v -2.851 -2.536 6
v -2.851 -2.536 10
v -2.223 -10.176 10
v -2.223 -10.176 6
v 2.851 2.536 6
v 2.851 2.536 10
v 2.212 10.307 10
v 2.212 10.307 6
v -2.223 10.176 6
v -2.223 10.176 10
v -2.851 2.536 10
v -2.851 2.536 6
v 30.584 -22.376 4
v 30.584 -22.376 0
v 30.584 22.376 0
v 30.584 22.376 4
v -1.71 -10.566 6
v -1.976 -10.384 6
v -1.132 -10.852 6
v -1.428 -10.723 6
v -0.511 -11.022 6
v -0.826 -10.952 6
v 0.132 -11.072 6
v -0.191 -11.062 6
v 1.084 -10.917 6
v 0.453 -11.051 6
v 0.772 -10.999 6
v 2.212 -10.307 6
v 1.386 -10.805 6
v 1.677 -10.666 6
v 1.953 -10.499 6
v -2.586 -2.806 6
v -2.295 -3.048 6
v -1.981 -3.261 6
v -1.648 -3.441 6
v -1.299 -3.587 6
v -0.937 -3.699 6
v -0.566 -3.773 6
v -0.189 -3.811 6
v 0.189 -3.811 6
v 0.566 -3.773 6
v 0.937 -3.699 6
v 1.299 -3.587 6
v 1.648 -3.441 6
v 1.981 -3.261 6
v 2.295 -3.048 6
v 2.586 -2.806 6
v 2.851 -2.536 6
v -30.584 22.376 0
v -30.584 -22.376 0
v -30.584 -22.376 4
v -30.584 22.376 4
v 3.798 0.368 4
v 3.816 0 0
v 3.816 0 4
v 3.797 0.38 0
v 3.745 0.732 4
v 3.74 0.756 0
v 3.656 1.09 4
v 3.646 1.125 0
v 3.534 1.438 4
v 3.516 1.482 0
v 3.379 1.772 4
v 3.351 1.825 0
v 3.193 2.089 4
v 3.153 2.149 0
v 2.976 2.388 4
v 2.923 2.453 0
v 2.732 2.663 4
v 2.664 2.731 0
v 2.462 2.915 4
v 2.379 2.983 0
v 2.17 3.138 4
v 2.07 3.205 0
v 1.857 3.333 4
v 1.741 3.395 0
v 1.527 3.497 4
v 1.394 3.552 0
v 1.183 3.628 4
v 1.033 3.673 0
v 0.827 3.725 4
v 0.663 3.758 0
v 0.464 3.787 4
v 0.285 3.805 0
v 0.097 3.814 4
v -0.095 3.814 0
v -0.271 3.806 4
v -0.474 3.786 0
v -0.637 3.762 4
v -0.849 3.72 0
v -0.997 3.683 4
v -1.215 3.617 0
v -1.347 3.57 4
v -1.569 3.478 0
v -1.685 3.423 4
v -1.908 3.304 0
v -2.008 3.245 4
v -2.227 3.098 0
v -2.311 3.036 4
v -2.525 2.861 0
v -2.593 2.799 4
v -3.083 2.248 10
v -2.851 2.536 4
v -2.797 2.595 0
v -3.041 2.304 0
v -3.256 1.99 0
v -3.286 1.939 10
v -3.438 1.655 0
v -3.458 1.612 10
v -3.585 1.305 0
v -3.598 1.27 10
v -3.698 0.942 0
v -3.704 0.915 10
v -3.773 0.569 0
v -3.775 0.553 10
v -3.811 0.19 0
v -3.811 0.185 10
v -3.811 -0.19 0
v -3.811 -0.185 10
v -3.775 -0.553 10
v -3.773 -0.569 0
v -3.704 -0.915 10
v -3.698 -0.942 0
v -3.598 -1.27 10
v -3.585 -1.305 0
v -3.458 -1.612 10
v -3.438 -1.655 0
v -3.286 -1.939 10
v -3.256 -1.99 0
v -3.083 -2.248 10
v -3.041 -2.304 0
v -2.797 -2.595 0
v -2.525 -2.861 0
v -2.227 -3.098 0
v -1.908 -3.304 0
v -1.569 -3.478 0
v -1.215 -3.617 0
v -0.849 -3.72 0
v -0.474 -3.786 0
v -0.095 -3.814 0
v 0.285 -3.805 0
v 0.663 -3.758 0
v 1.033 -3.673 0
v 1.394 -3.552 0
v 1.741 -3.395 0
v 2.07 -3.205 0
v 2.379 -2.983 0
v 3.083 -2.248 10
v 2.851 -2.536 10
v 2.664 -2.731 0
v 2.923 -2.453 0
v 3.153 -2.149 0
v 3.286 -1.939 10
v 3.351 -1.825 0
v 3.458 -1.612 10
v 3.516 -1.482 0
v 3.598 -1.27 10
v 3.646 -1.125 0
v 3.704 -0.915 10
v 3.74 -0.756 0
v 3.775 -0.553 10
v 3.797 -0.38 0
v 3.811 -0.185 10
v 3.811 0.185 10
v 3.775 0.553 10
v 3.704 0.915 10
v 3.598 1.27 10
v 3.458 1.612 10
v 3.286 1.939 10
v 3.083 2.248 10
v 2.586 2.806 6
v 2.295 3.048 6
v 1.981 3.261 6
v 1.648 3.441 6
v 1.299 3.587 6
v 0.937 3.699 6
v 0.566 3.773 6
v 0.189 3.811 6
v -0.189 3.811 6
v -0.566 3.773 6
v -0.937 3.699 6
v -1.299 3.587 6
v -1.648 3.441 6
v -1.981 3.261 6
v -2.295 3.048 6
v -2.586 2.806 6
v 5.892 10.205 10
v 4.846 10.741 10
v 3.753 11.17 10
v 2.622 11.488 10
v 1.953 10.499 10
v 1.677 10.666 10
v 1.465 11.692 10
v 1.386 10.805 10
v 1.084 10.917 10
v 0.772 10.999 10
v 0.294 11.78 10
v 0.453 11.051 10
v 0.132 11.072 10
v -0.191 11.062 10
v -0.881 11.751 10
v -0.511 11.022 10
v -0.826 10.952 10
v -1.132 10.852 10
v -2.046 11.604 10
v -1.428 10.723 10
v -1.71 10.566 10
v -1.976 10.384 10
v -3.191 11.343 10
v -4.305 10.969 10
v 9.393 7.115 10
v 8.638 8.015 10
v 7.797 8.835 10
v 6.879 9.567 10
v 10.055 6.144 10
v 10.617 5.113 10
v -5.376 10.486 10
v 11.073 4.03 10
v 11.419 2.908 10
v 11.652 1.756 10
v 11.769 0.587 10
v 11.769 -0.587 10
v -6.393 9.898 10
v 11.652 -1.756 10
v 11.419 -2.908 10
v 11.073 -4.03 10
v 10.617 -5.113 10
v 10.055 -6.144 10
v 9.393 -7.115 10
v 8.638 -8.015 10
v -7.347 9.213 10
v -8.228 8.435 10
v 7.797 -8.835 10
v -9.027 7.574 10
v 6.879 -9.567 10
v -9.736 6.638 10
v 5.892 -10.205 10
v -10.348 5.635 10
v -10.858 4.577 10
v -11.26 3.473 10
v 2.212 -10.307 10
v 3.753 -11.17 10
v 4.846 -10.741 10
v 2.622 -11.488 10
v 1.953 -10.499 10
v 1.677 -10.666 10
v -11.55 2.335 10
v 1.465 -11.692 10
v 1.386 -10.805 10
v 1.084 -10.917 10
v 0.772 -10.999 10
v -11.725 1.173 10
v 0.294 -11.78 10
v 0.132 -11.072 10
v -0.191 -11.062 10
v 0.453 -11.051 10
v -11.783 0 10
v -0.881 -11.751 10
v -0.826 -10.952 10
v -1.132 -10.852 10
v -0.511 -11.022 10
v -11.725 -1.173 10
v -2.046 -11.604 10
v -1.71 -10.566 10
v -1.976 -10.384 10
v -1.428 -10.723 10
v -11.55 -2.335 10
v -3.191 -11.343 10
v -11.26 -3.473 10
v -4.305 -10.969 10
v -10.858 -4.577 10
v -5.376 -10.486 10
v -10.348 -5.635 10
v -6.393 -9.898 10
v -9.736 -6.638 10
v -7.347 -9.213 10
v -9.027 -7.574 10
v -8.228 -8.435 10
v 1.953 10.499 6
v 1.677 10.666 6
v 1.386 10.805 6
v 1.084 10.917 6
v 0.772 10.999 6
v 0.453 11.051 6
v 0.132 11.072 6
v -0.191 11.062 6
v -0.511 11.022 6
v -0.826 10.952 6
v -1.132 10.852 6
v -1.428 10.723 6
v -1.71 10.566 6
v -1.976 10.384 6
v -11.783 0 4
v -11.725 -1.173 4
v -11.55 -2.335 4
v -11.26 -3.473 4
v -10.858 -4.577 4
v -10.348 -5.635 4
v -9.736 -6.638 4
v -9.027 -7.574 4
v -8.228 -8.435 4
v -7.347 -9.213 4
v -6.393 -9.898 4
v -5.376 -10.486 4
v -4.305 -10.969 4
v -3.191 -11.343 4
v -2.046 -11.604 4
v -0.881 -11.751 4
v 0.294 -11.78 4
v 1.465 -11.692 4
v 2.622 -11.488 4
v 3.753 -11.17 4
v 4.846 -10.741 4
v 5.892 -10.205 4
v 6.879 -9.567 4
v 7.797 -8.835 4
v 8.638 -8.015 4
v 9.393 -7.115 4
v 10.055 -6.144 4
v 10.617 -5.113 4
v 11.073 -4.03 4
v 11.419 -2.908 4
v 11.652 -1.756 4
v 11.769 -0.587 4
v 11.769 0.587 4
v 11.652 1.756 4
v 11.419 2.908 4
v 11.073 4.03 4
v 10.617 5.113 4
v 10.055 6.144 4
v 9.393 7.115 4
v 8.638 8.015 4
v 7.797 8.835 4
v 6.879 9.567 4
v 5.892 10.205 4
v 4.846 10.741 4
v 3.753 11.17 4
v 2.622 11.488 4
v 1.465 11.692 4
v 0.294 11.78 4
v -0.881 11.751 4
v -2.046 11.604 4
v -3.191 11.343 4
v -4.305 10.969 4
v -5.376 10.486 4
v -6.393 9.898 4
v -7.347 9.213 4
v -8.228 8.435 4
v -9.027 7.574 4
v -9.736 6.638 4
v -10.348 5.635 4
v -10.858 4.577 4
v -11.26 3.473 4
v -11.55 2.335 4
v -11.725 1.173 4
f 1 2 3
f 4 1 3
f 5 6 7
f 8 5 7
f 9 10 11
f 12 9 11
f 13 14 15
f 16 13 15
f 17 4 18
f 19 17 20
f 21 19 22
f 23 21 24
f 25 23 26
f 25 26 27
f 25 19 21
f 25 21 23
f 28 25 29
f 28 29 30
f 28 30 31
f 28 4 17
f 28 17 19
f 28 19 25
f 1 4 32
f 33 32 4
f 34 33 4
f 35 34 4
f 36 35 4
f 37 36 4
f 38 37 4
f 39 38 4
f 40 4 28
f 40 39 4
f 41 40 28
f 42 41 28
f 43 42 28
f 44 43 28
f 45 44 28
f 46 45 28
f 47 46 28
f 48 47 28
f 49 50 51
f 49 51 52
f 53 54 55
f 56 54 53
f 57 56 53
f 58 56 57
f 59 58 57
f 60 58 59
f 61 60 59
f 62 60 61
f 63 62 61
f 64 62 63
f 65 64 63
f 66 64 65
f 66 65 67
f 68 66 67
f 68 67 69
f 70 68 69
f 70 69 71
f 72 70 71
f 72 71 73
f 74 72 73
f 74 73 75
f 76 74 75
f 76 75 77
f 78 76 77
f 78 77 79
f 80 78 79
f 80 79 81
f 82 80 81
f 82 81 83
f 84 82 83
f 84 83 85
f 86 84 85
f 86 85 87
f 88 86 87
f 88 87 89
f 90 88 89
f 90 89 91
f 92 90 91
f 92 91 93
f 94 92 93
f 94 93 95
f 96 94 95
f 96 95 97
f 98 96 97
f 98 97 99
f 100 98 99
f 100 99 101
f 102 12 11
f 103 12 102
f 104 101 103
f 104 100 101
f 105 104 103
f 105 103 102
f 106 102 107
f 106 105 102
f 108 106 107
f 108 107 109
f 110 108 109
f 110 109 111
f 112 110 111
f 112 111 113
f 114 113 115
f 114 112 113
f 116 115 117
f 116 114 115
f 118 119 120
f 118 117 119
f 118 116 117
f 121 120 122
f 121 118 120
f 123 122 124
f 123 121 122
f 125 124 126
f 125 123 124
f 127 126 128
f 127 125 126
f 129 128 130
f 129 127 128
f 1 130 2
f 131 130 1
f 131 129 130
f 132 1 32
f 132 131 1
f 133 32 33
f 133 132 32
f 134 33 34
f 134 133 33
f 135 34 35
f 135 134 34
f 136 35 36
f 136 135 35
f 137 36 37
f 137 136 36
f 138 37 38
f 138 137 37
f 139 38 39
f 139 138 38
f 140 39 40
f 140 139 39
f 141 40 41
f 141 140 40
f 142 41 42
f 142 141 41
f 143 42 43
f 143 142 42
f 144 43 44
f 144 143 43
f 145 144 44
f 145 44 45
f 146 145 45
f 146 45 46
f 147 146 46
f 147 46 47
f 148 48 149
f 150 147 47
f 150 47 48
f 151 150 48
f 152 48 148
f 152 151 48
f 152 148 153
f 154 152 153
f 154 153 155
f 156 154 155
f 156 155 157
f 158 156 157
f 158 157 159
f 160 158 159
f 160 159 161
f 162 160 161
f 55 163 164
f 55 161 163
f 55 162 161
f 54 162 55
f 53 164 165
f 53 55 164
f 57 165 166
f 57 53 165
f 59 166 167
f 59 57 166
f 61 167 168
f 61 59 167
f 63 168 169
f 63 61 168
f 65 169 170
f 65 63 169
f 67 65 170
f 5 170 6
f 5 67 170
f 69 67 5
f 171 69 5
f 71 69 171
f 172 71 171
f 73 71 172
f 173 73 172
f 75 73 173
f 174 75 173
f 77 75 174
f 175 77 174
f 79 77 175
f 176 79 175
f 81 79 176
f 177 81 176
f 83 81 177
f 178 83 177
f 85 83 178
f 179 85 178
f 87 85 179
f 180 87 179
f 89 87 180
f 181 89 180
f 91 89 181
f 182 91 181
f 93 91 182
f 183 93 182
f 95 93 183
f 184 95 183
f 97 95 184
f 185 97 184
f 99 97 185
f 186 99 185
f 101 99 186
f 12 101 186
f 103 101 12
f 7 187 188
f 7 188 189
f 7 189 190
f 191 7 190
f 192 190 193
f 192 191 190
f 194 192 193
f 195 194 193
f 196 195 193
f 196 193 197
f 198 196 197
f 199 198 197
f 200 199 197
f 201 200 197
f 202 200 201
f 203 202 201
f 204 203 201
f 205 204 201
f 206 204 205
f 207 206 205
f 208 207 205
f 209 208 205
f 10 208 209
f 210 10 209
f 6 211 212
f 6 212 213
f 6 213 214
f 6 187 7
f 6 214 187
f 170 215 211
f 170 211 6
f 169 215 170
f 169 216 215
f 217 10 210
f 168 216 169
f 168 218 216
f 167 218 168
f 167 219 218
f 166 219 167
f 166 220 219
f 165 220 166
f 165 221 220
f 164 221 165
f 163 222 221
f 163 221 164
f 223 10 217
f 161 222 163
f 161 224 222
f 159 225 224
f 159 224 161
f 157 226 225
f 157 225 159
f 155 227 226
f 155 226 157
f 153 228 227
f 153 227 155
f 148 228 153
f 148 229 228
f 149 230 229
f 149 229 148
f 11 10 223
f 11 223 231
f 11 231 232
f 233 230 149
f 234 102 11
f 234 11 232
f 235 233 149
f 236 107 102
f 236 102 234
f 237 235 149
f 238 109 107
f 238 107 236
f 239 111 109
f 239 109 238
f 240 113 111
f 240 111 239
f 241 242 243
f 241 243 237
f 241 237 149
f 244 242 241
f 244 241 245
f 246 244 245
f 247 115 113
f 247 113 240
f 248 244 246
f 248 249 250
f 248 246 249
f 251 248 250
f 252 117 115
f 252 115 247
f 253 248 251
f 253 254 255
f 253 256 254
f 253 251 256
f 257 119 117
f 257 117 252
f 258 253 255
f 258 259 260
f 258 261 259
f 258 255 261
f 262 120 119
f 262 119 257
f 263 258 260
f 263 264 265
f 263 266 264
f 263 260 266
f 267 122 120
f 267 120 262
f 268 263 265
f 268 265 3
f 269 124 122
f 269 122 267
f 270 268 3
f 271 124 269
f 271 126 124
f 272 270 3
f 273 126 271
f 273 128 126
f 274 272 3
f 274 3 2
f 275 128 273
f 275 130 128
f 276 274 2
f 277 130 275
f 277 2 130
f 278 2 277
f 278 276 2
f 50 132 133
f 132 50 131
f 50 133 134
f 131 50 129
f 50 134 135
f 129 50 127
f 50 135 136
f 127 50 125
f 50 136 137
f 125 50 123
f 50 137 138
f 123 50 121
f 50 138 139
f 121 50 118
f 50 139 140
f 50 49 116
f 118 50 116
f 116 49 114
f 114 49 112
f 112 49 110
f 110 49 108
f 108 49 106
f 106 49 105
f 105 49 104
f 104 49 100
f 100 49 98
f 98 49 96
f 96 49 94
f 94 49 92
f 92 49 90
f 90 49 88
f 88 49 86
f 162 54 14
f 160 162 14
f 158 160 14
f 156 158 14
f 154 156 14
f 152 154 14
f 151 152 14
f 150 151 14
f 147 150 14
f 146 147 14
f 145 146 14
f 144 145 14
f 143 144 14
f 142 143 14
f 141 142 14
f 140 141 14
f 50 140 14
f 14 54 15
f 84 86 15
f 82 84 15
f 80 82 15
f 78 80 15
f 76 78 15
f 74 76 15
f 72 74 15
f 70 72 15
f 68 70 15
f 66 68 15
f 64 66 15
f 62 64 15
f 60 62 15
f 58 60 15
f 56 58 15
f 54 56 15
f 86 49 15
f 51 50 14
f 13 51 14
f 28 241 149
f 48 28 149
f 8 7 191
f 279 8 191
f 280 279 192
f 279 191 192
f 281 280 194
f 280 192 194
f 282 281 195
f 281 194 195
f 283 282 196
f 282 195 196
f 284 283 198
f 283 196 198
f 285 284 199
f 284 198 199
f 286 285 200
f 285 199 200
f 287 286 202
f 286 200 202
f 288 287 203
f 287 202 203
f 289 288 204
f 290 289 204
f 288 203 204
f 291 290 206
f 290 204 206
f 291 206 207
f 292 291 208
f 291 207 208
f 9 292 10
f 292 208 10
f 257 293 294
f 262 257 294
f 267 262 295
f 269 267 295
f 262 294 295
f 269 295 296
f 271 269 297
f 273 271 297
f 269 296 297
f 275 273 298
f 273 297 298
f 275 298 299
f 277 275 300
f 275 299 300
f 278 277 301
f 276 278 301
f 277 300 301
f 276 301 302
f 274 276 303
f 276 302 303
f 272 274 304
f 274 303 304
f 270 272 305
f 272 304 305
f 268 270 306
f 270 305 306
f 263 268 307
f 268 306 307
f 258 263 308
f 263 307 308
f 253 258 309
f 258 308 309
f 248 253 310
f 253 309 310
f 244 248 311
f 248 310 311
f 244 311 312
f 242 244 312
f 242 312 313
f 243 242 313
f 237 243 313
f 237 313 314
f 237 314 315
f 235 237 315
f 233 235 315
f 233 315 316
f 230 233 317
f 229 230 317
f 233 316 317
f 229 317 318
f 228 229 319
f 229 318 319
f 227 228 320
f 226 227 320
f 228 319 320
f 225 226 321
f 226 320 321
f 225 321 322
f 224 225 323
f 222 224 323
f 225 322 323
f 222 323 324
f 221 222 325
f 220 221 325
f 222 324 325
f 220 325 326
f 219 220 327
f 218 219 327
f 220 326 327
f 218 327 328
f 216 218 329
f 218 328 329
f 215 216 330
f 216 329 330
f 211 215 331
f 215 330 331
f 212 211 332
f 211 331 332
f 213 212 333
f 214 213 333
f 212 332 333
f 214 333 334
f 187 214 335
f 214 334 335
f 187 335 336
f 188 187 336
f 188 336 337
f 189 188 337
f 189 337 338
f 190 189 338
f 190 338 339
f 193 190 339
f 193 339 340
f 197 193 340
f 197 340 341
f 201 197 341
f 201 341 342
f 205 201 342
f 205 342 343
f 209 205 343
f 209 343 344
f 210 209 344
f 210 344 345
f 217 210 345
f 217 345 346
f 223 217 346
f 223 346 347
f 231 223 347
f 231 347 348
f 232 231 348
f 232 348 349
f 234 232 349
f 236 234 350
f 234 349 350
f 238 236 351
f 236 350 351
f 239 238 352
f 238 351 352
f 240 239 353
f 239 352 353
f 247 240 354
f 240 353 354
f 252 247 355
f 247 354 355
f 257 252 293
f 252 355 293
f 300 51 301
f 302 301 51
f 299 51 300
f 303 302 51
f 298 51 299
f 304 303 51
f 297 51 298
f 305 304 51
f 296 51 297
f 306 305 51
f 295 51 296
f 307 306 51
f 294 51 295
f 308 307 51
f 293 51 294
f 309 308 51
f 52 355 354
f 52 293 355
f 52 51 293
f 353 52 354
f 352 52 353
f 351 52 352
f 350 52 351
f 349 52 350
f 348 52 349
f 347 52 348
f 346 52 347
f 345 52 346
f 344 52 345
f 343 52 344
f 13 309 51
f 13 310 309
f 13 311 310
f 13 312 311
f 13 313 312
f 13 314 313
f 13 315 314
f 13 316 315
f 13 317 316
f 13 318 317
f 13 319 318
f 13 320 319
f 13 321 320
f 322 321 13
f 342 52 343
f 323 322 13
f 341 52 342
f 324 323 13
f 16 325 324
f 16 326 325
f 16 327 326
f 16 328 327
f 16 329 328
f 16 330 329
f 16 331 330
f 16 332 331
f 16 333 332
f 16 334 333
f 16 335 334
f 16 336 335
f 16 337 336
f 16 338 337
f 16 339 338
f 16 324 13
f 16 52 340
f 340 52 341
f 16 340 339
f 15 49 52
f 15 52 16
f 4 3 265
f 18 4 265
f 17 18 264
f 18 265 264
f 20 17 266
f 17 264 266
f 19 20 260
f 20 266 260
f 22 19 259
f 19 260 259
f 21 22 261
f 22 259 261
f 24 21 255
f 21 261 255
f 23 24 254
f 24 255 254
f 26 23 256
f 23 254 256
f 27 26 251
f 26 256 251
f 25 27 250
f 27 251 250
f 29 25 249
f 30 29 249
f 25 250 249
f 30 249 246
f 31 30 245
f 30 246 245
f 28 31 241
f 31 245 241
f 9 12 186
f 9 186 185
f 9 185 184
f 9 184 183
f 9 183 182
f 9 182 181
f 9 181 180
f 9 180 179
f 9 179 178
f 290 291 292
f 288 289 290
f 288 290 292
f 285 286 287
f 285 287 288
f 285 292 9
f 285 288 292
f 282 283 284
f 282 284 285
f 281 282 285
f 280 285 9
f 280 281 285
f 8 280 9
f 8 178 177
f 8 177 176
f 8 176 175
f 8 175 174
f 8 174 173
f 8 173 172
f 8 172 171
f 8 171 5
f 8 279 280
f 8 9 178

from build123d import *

# Parameters (mm, degrees)
ESQUISSE1_W             = 61.168999858
ESQUISSE1_H             = 44.751998484
ESQUISSE1_R             = 3.815511502
BOSS_EXTRU_2_DEPTH      = 4
BOSS_EXTRU_4_START      = 4
ESQUISSE2_R             = 11.783463465
BOSS_EXTRU_4_DEPTH      = 6
ENL_V_MAT_EXTRU_1_DEPTH = 4
ESQUISSE1_2_R           = 3.815511502
ENL_V_MAT_EXTRU_3_DEPTH = 40.193073087


with BuildPart() as part:
    # Esquisse1 → Boss.-Extru.2 (new body)
    with BuildSketch(Plane.XY):
        Rectangle(ESQUISSE1_W, ESQUISSE1_H)
        Circle(ESQUISSE1_R, mode=Mode.SUBTRACT)
    extrude(amount=BOSS_EXTRU_2_DEPTH)

    # Esquisse2 → Boss.-Extru.4 (add)
    with BuildSketch(Plane.XY.offset(BOSS_EXTRU_4_START)):
        Circle(ESQUISSE2_R)
    extrude(amount=BOSS_EXTRU_4_DEPTH)

    # Esquisse4 → Enlèv. mat.-Extru.1 (cut)
    with BuildSketch(Plane.XY.offset(10)):
        with BuildLine():
            Line((2.87019869, 2.302904251), (2.212319523, 10.306766943))
            ThreePointArc((2.212319523, 10.306766943), (-0.029730087, 11.070975118), (-2.223029733, 10.17641531))
            Line((-2.223029733, 10.17641531), (-2.870198645, 2.302904307))
            ThreePointArc((-2.870198645, 2.302904307), (-3.679865285, 0), (-2.870198645, -2.302904307))
            Line((-2.870198645, -2.302904307), (-2.223029733, -10.17641531))
            ThreePointArc((-2.223029733, -10.17641531), (-0.029730087, -11.070975118), (2.212319523, -10.306766943))
            Line((2.212319523, -10.306766943), (2.87019869, -2.302904251))
            ThreePointArc((2.87019869, -2.302904251), (3.679865285, 0), (2.87019869, 2.302904251))
        make_face()
    extrude(amount=-ENL_V_MAT_EXTRU_1_DEPTH, mode=Mode.SUBTRACT)

    # Esquisse1<2> → Enlèv. mat.-Extru.3 (cut, through all)
    with BuildSketch(Plane.XY):
        Circle(ESQUISSE1_2_R)
    extrude(amount=ENL_V_MAT_EXTRU_3_DEPTH, mode=Mode.SUBTRACT)


solid = part.part
